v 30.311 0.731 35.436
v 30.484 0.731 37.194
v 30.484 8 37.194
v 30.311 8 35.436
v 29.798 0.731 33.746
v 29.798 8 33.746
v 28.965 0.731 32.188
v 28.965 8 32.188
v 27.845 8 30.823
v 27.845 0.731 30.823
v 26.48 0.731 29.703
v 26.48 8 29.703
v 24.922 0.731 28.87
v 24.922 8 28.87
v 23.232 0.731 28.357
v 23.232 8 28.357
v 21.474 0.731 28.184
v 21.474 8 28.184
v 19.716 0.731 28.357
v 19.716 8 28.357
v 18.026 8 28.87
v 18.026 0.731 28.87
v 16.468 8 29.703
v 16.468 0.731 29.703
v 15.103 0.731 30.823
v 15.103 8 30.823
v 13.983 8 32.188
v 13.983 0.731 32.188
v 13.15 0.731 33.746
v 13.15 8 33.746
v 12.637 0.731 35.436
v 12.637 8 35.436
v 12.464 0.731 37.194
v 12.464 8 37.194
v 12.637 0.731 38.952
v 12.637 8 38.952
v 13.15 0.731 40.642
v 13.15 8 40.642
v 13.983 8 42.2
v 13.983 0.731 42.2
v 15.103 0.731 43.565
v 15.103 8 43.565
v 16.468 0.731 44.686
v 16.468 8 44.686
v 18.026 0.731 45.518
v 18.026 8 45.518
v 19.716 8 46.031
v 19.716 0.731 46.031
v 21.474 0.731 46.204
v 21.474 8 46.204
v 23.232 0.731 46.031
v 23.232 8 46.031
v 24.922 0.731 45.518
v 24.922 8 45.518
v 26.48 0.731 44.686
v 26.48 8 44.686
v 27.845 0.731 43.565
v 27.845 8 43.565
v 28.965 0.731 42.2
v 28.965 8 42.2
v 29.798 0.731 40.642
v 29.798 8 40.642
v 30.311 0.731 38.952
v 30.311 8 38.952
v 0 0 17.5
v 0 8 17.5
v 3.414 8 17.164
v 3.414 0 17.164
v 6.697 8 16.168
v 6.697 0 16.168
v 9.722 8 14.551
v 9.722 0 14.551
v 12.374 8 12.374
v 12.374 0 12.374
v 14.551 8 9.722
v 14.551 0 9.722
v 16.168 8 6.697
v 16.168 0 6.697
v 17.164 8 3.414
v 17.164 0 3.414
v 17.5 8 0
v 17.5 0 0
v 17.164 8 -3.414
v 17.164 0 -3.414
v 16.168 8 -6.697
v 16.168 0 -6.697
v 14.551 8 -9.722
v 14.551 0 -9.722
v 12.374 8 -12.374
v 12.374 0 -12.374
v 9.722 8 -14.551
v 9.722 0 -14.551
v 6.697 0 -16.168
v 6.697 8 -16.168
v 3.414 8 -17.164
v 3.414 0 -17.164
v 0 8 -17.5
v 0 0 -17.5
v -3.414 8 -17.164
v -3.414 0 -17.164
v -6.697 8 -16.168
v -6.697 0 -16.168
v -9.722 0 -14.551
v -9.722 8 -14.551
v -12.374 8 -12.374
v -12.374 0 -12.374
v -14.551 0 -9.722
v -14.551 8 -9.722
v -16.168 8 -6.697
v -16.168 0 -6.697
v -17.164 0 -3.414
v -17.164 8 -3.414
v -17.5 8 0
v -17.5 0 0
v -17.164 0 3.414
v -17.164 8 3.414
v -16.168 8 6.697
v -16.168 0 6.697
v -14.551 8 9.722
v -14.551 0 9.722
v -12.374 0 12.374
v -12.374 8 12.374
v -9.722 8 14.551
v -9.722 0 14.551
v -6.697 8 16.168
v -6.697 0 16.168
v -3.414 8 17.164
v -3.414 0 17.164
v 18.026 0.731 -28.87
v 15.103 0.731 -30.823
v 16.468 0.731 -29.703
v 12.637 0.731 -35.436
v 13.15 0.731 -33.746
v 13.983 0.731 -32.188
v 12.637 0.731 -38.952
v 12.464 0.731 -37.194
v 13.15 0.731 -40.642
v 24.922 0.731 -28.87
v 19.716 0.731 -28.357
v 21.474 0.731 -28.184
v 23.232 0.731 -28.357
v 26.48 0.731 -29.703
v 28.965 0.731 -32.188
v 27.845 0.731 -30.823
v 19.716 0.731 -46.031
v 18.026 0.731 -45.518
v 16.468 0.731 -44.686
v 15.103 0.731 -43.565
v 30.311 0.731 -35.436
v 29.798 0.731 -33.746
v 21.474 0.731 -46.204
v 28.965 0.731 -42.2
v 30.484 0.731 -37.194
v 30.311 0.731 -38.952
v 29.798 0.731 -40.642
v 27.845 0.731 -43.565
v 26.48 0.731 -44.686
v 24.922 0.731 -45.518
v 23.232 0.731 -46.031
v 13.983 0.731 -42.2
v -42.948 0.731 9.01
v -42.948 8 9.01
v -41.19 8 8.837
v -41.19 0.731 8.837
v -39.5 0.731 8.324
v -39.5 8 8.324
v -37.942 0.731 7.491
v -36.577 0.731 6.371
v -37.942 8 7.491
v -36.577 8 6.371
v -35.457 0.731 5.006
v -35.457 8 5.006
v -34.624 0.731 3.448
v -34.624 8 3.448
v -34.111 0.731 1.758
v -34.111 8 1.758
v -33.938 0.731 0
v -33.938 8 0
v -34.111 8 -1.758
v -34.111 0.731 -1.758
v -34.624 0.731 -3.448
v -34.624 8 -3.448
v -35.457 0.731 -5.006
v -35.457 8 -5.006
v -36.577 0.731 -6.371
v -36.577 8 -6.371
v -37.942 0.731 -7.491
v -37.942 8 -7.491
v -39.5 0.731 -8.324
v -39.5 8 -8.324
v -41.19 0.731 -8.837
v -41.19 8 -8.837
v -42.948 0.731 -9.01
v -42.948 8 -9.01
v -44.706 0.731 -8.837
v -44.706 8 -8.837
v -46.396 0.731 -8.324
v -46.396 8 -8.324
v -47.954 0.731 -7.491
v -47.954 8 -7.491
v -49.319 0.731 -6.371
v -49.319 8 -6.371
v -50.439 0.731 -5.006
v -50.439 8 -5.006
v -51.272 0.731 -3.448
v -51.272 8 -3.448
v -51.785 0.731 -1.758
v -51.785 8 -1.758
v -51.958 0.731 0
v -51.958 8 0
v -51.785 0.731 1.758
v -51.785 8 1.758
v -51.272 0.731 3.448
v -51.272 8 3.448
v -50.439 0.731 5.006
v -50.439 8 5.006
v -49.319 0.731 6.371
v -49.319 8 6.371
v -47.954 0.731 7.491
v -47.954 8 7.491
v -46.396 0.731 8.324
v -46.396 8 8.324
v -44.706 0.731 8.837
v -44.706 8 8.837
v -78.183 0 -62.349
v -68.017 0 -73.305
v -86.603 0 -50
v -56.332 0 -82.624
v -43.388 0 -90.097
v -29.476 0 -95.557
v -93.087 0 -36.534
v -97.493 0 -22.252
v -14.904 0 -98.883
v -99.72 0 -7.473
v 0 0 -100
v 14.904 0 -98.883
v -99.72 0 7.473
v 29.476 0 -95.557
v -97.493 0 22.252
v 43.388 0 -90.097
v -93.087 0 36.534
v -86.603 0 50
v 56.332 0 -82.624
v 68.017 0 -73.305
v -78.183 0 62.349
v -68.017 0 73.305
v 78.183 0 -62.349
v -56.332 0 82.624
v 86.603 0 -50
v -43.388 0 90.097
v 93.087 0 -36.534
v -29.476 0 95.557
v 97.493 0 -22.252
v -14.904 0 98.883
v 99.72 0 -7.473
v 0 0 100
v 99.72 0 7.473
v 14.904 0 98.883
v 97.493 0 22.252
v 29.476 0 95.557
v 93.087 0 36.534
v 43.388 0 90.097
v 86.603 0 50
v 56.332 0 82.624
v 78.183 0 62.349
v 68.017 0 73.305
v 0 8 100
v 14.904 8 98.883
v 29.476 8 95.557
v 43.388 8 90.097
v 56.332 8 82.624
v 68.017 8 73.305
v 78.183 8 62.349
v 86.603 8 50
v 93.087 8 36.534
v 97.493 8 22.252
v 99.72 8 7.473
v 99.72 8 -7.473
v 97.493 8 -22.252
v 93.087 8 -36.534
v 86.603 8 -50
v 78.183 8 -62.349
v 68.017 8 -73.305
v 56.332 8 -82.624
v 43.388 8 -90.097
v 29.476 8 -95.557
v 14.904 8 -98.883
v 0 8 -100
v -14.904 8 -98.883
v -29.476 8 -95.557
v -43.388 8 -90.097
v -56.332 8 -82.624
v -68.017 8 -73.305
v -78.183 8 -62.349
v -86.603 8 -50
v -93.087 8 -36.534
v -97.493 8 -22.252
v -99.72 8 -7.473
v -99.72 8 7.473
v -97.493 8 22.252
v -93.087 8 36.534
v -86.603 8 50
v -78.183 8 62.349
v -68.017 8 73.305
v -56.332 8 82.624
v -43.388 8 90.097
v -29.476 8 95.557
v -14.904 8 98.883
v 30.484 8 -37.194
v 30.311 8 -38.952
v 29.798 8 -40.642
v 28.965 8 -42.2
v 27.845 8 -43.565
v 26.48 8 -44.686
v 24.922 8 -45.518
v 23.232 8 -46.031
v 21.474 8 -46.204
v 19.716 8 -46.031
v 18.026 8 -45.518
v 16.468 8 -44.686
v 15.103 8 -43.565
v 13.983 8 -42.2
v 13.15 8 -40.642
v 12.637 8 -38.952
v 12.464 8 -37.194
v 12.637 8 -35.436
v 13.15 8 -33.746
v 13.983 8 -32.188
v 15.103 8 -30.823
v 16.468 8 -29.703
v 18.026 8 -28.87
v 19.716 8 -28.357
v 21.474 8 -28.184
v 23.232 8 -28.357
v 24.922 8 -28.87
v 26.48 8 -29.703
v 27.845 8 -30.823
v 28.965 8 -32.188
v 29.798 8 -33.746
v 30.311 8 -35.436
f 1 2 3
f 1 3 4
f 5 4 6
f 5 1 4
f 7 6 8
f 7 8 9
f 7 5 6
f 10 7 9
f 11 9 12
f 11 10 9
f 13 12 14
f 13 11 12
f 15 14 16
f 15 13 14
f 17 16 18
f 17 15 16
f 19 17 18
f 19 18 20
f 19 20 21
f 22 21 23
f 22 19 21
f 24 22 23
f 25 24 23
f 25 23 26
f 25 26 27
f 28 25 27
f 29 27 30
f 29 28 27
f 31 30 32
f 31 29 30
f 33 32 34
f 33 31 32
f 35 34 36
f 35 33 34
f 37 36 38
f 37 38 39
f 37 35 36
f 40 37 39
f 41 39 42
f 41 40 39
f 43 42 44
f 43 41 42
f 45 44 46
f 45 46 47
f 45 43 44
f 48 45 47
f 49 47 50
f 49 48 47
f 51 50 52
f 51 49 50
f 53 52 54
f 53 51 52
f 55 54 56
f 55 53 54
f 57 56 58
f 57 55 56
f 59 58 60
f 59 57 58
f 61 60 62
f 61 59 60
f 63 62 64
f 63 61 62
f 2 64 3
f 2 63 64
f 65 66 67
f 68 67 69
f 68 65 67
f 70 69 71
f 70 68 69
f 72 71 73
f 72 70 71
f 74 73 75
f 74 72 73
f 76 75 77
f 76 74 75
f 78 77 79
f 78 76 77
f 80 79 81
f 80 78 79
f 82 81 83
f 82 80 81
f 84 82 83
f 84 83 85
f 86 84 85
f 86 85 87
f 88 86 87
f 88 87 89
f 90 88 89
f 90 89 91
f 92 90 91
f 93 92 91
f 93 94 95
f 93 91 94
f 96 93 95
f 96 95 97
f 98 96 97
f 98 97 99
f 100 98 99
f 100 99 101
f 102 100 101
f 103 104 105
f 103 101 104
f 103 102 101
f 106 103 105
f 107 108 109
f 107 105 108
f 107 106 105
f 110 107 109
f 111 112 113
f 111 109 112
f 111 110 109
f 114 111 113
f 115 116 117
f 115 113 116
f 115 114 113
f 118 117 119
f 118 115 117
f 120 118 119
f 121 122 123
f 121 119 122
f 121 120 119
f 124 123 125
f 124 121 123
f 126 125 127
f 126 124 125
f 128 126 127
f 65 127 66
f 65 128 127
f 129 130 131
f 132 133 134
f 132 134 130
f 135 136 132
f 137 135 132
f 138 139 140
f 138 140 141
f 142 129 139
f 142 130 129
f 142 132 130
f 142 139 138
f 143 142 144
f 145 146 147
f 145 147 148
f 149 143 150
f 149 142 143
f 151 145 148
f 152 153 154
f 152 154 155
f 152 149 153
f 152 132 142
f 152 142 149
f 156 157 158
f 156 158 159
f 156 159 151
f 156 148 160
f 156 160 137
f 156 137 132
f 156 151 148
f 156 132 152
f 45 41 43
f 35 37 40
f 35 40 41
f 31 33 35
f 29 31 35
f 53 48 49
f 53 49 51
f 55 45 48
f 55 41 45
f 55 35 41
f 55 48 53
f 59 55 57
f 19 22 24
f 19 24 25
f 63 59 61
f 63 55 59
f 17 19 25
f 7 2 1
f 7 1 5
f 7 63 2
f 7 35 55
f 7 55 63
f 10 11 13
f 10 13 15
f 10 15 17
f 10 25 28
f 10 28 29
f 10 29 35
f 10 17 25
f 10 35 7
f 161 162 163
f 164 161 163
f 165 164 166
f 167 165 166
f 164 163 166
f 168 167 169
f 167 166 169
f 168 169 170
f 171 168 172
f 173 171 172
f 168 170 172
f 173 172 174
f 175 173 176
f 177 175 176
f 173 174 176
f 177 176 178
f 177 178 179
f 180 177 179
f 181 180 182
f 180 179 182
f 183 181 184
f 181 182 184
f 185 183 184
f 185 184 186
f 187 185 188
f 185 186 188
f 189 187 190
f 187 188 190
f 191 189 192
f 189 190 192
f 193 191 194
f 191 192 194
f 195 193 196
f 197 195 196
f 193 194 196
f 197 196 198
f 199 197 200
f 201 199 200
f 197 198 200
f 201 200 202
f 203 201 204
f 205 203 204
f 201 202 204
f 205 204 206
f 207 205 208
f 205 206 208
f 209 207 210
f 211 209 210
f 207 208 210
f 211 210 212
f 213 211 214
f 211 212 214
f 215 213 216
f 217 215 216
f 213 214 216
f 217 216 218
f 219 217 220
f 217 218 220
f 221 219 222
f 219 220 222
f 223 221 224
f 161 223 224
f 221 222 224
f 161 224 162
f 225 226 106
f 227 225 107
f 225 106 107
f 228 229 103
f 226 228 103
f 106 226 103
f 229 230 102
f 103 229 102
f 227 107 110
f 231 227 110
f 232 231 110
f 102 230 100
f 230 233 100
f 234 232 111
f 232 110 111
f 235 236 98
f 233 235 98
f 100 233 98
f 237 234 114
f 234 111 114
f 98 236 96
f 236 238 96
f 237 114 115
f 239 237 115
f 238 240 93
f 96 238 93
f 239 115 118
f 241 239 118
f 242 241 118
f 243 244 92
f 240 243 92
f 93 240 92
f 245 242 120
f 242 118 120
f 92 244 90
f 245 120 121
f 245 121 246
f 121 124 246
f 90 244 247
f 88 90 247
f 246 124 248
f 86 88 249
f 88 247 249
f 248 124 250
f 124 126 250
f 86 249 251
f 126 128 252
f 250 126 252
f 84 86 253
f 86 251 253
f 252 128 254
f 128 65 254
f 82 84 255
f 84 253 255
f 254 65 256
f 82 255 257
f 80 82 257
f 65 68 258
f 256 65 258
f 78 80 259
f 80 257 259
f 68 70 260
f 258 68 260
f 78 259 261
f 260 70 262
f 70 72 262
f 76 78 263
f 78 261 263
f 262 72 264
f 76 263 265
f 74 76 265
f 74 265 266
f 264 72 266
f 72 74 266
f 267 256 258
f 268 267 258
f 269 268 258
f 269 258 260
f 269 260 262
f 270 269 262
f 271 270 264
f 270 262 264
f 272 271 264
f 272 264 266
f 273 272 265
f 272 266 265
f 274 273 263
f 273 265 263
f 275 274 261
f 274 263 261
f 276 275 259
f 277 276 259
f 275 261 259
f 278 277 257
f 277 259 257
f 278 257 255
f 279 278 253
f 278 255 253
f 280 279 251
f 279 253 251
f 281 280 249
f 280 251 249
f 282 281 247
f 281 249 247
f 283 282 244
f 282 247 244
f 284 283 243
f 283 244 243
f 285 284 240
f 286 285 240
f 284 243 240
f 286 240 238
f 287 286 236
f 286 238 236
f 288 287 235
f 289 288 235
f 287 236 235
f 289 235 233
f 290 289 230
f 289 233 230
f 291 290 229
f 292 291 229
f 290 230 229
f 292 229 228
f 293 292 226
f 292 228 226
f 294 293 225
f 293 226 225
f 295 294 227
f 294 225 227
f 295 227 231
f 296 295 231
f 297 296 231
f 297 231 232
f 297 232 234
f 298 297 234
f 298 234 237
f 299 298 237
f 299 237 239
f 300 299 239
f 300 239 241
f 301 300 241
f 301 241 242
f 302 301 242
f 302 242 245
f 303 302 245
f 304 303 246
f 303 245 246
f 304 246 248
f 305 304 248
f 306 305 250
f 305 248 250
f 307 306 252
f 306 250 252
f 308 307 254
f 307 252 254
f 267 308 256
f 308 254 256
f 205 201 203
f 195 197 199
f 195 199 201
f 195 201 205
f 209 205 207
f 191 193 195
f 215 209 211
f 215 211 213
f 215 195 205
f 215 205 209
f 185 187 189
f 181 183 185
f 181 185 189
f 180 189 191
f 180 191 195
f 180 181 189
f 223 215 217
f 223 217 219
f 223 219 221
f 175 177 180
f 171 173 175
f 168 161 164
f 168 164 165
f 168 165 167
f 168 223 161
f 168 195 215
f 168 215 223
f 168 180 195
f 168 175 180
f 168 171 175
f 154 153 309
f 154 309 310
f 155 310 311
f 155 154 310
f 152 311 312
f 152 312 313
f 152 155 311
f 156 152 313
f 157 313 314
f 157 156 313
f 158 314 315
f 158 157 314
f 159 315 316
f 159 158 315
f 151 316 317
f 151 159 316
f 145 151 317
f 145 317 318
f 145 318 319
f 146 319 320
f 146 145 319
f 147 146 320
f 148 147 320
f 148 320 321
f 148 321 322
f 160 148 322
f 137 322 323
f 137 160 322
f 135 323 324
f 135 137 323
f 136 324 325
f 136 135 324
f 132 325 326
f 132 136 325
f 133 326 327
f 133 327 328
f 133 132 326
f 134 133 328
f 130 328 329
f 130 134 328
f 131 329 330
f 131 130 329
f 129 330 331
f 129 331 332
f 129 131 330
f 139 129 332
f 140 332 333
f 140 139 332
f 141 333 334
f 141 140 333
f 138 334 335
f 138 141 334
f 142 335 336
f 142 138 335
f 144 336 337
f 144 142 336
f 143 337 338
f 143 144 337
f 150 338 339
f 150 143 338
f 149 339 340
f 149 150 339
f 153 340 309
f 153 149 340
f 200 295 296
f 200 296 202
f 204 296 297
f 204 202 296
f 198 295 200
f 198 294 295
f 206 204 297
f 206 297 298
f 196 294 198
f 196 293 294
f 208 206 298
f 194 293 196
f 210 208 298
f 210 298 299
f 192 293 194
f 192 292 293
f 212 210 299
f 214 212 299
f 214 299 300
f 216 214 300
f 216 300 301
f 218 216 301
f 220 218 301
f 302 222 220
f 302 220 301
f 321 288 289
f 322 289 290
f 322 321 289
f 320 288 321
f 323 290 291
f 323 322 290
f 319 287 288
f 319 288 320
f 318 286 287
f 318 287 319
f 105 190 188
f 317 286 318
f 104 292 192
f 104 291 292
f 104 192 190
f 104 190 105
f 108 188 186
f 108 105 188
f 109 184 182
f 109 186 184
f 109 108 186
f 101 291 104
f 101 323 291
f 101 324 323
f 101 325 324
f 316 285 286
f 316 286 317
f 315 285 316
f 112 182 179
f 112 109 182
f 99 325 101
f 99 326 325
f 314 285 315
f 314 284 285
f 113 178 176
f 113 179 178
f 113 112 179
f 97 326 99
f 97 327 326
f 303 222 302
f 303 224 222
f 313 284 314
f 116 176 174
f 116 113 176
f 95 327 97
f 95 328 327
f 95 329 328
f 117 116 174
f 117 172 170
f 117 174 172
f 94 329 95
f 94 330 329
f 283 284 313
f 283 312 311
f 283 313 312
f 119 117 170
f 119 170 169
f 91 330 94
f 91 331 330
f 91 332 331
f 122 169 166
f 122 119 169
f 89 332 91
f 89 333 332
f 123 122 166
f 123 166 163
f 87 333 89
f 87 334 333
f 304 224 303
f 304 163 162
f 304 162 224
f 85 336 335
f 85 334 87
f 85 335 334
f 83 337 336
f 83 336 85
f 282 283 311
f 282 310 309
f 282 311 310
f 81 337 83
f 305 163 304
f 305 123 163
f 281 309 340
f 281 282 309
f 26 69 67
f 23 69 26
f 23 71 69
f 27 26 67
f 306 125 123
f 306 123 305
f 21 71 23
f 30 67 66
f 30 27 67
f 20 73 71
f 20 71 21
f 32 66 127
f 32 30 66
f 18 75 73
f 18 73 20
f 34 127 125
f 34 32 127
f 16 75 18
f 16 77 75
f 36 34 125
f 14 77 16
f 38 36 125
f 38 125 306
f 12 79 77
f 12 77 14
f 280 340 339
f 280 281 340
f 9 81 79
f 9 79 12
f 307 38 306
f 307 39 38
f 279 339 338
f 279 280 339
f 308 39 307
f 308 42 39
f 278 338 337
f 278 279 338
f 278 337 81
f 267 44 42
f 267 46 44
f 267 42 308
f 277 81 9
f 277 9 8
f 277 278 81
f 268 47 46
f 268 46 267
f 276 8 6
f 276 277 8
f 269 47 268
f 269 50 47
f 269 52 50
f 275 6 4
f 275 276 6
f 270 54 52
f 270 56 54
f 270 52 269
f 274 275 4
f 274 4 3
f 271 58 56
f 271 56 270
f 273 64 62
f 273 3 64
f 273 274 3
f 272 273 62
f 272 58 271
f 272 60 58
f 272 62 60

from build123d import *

# Parameters (mm, degrees)
SKETCH1_R           = 100
BOSS_EXTRUDE1_DEPTH = 8
SKETCH2_R           = 17.5
CUT_EXTRUDE1_DEPTH  = 142.647449677
SKETCH3_R           = 9.009876889
CUT_EXTRUDE2_DEPTH  = 7.269340773
CIRPATTERN1_COUNT   = 3


with BuildPart() as part:
    # Sketch1 → Boss-Extrude1 (new body)
    with BuildSketch(Plane(origin=(0, 0, 0), x_dir=(1, 0, 0), z_dir=(0, 1, 0))):
        Circle(SKETCH1_R)
    extrude(amount=BOSS_EXTRUDE1_DEPTH)

    # Sketch2 → Cut-Extrude1 (cut, through all)
    with BuildSketch(Plane(origin=(0, 0, 0), x_dir=(1, 0, 0), z_dir=(0, 1, 0))):
        Circle(SKETCH2_R)
    extrude(amount=CUT_EXTRUDE1_DEPTH, mode=Mode.SUBTRACT)

    # Sketch3 → Cut-Extrude2 (cut)
    with BuildSketch(Plane(origin=(0, 8, 0), x_dir=(1, 0, 0), z_dir=(0, 1, 0))):
        with Locations((-42.948020952, 0)):
            Circle(SKETCH3_R)
    cut_extrude2 = extrude(amount=-CUT_EXTRUDE2_DEPTH, mode=Mode.SUBTRACT)

    # CirPattern1: Cut-Extrude2 ×3 about axis
    cirpattern1_axis = Axis((0, 0, 0), (0, 1, 0))
    for i in range(1, CIRPATTERN1_COUNT):
        add(cut_extrude2.rotate(cirpattern1_axis, i * 360 / CIRPATTERN1_COUNT), mode=Mode.SUBTRACT)


solid = part.part
